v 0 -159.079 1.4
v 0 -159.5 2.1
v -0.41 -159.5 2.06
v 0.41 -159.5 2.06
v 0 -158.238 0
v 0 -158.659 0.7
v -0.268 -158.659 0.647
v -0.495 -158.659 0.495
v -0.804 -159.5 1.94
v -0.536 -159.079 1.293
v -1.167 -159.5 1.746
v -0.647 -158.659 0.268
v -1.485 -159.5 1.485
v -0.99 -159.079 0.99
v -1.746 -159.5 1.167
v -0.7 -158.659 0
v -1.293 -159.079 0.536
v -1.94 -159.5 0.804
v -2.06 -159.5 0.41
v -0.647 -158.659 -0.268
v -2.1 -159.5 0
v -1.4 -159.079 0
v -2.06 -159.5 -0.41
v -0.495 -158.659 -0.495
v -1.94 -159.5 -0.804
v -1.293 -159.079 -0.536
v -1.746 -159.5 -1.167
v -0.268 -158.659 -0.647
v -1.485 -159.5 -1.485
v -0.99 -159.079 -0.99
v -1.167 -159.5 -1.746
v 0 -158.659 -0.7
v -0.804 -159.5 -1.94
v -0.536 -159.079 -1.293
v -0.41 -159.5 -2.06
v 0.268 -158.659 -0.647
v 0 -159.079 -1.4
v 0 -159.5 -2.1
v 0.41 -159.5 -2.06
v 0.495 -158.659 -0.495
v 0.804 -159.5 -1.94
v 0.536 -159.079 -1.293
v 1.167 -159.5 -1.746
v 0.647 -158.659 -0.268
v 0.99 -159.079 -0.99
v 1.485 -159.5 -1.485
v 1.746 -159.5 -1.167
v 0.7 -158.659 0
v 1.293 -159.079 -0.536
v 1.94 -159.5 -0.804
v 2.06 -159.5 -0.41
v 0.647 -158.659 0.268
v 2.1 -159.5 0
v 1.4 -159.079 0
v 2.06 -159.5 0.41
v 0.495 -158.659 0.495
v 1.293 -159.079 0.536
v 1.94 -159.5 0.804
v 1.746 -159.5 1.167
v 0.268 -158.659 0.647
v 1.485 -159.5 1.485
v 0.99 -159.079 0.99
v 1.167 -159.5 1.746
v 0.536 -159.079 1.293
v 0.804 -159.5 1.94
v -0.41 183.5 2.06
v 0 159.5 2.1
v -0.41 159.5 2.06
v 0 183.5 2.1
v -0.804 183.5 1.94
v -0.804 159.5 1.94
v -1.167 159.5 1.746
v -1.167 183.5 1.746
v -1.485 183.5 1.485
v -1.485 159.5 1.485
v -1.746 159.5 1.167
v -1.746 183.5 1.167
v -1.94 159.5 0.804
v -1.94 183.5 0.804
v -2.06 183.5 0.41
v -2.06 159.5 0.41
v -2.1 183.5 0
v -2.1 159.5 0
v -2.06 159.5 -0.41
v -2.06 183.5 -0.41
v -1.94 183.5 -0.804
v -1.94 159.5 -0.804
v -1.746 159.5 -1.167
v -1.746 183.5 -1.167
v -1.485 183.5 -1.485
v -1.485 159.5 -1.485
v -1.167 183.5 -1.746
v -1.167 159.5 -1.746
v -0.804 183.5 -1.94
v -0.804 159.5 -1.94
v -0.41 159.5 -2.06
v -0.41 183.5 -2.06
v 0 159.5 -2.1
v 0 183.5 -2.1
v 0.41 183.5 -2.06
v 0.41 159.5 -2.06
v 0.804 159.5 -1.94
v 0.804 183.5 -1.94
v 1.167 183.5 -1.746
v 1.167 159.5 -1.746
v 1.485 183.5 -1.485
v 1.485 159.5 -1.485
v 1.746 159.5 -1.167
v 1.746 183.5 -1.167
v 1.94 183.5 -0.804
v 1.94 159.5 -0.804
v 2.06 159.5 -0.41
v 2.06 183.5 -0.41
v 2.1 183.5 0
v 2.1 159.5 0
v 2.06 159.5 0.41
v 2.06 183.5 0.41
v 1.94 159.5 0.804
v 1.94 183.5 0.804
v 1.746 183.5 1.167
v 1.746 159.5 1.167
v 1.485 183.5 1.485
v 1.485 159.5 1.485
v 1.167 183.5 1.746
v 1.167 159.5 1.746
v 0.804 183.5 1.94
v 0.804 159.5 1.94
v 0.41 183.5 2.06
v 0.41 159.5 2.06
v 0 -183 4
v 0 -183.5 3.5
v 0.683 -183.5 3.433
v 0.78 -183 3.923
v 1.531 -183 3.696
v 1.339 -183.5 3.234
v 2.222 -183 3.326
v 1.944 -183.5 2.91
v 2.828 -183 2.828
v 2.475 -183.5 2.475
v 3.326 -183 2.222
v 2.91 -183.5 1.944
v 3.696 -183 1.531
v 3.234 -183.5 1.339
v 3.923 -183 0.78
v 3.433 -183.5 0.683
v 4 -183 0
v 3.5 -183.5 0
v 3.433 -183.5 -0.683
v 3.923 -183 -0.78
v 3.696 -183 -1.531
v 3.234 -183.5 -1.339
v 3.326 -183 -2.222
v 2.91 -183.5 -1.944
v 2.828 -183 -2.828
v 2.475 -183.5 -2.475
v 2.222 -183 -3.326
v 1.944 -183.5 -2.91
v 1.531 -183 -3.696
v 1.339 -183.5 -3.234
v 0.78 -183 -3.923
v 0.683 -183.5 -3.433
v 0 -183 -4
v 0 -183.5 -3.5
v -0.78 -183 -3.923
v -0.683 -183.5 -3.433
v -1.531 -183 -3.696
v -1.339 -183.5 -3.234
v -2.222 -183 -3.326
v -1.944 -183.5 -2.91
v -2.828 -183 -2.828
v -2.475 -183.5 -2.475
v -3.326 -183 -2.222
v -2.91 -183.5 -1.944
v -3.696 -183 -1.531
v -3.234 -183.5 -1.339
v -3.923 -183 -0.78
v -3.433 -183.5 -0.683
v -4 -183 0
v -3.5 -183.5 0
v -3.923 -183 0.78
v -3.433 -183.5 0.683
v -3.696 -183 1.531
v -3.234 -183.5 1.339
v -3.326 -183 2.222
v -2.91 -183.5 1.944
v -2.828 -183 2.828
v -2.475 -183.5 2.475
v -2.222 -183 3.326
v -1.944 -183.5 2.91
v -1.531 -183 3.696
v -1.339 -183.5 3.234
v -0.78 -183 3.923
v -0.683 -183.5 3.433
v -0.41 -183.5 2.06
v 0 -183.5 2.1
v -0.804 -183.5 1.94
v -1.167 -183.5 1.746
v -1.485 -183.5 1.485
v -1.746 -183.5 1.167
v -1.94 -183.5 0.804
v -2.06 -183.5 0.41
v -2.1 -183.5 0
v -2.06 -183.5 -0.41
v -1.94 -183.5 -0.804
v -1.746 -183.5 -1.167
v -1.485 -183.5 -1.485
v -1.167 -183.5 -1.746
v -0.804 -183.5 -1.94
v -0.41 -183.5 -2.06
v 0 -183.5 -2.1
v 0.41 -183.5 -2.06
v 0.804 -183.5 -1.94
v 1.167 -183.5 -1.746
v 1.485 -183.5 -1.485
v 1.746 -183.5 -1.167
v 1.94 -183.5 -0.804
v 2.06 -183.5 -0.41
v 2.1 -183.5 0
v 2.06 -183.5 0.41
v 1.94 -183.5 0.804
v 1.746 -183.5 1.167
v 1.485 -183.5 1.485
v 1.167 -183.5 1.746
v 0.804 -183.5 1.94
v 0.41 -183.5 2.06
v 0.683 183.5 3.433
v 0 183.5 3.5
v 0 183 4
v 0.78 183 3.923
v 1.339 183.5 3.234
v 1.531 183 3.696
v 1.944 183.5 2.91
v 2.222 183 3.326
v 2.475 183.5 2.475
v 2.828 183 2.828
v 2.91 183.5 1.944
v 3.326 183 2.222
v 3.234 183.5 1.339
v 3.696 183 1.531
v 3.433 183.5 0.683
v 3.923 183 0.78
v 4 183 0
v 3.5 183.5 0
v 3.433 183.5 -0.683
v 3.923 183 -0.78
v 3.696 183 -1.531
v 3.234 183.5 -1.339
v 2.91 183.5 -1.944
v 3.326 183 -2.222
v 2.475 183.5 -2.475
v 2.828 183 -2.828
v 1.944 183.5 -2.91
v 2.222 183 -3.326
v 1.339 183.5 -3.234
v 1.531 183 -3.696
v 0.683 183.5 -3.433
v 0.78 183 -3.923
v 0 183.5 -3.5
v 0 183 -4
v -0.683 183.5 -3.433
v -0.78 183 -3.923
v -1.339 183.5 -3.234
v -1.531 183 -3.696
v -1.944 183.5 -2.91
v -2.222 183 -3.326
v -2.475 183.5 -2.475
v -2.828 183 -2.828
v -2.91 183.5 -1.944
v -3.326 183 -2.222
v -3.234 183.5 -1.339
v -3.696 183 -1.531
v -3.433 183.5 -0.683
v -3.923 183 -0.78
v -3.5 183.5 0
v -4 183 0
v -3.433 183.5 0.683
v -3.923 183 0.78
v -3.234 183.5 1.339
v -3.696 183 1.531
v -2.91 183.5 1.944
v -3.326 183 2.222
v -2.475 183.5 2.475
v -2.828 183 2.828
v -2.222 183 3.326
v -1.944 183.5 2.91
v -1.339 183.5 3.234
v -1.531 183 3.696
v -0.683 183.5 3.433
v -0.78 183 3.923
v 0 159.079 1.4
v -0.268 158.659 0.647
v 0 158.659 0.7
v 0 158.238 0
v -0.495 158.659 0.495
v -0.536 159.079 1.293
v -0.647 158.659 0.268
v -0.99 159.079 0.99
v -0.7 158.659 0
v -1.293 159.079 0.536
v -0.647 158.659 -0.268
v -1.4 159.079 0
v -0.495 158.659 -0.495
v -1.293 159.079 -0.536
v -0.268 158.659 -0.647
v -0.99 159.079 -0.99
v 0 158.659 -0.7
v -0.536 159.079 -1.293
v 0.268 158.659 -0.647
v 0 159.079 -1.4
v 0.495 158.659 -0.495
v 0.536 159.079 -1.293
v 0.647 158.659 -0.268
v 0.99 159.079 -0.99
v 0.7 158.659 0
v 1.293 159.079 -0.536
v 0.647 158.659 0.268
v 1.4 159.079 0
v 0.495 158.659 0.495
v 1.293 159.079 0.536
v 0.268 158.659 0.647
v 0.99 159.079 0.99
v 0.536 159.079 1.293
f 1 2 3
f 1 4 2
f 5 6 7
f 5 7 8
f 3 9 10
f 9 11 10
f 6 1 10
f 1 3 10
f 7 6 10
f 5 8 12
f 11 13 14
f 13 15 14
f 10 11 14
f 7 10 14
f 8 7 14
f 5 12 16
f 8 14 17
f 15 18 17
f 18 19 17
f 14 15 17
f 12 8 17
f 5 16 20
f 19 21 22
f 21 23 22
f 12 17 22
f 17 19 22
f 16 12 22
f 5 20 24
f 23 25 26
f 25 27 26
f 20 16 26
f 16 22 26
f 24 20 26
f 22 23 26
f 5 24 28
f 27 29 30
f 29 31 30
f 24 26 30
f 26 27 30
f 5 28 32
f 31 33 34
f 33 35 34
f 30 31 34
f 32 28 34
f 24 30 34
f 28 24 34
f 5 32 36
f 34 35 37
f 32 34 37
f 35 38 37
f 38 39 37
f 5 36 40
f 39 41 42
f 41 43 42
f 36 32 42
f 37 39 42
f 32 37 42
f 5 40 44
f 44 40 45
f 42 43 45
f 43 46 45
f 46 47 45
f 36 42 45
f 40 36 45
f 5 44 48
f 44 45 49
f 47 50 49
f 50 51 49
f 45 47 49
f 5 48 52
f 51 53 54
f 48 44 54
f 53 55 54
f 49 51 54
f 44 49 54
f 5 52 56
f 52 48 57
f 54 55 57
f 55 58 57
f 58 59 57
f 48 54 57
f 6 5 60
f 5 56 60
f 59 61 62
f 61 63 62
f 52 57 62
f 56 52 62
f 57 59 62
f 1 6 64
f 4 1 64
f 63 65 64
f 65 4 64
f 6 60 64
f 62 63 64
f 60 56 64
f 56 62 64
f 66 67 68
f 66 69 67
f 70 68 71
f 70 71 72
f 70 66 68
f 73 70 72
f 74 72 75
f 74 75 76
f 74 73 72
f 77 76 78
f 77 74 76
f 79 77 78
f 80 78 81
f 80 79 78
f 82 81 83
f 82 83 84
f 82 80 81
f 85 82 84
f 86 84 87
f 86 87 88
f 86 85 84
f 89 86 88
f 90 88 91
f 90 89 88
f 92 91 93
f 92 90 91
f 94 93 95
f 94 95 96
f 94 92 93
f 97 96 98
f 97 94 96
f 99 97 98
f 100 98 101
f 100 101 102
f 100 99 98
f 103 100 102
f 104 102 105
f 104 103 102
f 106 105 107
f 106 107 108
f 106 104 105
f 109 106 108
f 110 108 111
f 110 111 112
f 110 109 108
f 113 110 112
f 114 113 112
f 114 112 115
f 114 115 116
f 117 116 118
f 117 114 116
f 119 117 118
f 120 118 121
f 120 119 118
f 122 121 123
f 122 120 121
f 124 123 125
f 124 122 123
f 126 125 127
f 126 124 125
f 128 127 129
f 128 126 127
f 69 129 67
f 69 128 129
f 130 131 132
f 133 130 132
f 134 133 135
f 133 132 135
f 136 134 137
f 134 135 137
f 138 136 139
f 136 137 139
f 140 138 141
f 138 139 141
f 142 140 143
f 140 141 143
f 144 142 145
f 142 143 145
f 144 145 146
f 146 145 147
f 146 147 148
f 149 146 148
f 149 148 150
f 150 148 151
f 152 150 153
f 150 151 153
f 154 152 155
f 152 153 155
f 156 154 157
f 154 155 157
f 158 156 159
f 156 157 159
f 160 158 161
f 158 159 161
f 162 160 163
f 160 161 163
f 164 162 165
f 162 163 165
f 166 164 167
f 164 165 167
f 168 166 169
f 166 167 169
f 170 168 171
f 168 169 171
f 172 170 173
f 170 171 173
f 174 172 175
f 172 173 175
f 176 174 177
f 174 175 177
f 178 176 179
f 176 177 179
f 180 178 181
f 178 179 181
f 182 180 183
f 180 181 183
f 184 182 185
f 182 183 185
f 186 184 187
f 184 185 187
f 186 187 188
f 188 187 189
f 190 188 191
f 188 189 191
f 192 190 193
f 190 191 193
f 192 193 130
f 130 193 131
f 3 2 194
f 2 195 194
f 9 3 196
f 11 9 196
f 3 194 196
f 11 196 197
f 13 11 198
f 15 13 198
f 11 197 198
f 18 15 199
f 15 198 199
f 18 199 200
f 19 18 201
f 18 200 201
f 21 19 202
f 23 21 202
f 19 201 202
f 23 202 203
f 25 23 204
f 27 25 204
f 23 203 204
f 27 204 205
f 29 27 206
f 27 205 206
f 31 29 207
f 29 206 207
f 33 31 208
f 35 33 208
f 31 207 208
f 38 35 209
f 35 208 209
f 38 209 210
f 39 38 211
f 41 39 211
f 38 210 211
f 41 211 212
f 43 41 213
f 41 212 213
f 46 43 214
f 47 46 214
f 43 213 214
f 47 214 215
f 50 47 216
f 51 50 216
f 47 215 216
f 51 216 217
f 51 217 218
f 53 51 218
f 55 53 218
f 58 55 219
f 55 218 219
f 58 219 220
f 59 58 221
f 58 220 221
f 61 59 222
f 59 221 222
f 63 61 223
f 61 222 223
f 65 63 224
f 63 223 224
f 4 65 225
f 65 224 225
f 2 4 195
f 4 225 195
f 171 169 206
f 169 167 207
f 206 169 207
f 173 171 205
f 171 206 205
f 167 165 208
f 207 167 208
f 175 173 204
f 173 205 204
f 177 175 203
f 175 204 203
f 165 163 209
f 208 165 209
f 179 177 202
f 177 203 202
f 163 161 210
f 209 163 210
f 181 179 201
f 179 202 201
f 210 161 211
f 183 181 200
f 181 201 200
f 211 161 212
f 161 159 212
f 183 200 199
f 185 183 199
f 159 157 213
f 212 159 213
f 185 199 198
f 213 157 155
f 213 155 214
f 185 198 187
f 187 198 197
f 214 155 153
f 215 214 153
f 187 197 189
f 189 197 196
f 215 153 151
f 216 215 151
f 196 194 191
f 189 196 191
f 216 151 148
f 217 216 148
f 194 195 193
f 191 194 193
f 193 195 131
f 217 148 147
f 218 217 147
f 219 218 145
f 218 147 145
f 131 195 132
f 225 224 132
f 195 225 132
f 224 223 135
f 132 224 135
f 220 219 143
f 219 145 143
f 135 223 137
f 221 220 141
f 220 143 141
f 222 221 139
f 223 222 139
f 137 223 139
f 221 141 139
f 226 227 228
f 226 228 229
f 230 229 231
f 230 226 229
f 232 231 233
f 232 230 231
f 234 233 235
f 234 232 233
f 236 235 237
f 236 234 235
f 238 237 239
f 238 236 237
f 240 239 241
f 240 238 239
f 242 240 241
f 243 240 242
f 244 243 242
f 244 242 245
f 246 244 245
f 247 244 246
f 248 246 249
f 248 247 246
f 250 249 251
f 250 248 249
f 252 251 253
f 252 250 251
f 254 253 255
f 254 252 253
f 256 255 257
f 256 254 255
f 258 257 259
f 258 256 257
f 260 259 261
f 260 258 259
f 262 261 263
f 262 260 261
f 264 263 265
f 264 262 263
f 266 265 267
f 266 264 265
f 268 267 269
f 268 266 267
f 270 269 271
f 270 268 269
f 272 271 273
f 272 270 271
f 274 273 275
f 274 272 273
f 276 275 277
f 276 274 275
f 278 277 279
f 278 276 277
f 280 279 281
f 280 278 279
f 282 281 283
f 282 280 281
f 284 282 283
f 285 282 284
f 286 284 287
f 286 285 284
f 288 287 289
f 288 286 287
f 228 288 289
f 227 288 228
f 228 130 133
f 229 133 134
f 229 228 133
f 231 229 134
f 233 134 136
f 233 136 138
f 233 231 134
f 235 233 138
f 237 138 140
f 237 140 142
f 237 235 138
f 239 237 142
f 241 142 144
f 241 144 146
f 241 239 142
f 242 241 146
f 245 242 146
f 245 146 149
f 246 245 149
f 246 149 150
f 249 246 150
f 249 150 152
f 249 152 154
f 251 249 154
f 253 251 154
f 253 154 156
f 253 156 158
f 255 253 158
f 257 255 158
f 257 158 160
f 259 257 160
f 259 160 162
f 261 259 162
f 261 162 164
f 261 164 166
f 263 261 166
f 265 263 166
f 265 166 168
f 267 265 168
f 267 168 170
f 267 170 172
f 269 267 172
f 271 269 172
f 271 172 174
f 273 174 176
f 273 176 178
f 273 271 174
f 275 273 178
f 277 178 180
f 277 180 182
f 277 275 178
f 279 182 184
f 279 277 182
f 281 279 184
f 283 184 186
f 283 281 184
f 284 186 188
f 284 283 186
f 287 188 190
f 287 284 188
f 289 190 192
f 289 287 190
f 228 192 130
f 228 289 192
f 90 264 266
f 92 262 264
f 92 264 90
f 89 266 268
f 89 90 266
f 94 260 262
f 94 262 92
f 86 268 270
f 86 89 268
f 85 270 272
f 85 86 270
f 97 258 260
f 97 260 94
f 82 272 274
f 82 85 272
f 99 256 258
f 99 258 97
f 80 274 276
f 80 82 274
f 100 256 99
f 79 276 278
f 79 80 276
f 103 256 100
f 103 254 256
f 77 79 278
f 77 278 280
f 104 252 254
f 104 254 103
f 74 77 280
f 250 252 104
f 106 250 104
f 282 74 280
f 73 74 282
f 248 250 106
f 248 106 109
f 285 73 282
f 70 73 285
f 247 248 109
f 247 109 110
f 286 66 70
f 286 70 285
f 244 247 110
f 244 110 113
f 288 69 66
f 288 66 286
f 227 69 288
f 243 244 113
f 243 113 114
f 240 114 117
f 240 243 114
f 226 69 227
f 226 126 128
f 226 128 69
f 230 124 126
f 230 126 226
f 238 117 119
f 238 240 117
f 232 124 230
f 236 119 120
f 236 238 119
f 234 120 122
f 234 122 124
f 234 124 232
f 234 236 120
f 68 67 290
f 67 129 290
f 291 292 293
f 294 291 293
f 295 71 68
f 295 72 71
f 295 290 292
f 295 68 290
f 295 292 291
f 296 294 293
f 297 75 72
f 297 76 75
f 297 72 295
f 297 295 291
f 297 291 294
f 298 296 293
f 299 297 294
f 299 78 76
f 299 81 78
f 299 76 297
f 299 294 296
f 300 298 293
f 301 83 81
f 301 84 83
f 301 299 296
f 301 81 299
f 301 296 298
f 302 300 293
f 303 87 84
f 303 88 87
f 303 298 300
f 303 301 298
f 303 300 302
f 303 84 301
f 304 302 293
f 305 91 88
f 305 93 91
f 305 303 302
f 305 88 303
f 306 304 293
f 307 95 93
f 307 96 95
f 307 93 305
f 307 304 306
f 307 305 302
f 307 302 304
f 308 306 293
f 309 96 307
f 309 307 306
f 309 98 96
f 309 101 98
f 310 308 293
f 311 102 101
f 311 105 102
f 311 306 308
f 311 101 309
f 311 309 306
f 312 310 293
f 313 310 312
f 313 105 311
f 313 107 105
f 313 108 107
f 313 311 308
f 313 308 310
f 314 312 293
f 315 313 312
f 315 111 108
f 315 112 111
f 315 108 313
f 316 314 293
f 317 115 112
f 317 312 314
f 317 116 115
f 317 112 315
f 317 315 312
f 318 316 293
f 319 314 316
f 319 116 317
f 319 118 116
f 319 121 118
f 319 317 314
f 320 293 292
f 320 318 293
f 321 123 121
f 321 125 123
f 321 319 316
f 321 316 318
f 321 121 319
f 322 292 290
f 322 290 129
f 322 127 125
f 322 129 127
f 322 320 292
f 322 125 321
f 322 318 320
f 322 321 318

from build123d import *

# Parameters (mm, degrees)
ESBO_O3_R                = 4
RESSALTO_EXTRUS_O1_DEPTH = 183.5
CHANFRO1_SIZE            = 0.5


with BuildPart() as part:
    # Esboço3 → Ressalto-extrusão1 (new, symmetric)
    with BuildSketch(Plane(origin=(0, 0, 0), x_dir=(1, 0, 0), z_dir=(0, 1, 0))):
        with Locations(Location((0, 0, 0), (0, 0, 270))):
            Circle(ESBO_O3_R)
    extrude(amount=RESSALTO_EXTRUS_O1_DEPTH, both=True)

    # Chanfro1
    chanfro1_edges = [part.edges().sort_by_distance(p)[0] for p in [
        (0, -183.5, -4),
        (0, 183.5, -4),
    ]]
    chamfer(chanfro1_edges, length=CHANFRO1_SIZE)

    # Esboço4 → Furo roscado de M51 (revolve, cut)
    with BuildSketch(Plane(origin=(0, 183.5, 0), x_dir=(0, 0, 1), z_dir=(1, 0, 0))):
        Polygon((0, 0), (0, 25.2618073), (2.1, 24), (2.1, 0), align=None)
    furo_roscado_de_m51 = revolve(axis=Axis((0, 189.85, 0), (0, -1, 0)), mode=Mode.SUBTRACT)

    # Espelhar1: Furo roscado de M51 across plane
    add(furo_roscado_de_m51.mirror(Plane.ZX), mode=Mode.SUBTRACT)


solid = part.part
